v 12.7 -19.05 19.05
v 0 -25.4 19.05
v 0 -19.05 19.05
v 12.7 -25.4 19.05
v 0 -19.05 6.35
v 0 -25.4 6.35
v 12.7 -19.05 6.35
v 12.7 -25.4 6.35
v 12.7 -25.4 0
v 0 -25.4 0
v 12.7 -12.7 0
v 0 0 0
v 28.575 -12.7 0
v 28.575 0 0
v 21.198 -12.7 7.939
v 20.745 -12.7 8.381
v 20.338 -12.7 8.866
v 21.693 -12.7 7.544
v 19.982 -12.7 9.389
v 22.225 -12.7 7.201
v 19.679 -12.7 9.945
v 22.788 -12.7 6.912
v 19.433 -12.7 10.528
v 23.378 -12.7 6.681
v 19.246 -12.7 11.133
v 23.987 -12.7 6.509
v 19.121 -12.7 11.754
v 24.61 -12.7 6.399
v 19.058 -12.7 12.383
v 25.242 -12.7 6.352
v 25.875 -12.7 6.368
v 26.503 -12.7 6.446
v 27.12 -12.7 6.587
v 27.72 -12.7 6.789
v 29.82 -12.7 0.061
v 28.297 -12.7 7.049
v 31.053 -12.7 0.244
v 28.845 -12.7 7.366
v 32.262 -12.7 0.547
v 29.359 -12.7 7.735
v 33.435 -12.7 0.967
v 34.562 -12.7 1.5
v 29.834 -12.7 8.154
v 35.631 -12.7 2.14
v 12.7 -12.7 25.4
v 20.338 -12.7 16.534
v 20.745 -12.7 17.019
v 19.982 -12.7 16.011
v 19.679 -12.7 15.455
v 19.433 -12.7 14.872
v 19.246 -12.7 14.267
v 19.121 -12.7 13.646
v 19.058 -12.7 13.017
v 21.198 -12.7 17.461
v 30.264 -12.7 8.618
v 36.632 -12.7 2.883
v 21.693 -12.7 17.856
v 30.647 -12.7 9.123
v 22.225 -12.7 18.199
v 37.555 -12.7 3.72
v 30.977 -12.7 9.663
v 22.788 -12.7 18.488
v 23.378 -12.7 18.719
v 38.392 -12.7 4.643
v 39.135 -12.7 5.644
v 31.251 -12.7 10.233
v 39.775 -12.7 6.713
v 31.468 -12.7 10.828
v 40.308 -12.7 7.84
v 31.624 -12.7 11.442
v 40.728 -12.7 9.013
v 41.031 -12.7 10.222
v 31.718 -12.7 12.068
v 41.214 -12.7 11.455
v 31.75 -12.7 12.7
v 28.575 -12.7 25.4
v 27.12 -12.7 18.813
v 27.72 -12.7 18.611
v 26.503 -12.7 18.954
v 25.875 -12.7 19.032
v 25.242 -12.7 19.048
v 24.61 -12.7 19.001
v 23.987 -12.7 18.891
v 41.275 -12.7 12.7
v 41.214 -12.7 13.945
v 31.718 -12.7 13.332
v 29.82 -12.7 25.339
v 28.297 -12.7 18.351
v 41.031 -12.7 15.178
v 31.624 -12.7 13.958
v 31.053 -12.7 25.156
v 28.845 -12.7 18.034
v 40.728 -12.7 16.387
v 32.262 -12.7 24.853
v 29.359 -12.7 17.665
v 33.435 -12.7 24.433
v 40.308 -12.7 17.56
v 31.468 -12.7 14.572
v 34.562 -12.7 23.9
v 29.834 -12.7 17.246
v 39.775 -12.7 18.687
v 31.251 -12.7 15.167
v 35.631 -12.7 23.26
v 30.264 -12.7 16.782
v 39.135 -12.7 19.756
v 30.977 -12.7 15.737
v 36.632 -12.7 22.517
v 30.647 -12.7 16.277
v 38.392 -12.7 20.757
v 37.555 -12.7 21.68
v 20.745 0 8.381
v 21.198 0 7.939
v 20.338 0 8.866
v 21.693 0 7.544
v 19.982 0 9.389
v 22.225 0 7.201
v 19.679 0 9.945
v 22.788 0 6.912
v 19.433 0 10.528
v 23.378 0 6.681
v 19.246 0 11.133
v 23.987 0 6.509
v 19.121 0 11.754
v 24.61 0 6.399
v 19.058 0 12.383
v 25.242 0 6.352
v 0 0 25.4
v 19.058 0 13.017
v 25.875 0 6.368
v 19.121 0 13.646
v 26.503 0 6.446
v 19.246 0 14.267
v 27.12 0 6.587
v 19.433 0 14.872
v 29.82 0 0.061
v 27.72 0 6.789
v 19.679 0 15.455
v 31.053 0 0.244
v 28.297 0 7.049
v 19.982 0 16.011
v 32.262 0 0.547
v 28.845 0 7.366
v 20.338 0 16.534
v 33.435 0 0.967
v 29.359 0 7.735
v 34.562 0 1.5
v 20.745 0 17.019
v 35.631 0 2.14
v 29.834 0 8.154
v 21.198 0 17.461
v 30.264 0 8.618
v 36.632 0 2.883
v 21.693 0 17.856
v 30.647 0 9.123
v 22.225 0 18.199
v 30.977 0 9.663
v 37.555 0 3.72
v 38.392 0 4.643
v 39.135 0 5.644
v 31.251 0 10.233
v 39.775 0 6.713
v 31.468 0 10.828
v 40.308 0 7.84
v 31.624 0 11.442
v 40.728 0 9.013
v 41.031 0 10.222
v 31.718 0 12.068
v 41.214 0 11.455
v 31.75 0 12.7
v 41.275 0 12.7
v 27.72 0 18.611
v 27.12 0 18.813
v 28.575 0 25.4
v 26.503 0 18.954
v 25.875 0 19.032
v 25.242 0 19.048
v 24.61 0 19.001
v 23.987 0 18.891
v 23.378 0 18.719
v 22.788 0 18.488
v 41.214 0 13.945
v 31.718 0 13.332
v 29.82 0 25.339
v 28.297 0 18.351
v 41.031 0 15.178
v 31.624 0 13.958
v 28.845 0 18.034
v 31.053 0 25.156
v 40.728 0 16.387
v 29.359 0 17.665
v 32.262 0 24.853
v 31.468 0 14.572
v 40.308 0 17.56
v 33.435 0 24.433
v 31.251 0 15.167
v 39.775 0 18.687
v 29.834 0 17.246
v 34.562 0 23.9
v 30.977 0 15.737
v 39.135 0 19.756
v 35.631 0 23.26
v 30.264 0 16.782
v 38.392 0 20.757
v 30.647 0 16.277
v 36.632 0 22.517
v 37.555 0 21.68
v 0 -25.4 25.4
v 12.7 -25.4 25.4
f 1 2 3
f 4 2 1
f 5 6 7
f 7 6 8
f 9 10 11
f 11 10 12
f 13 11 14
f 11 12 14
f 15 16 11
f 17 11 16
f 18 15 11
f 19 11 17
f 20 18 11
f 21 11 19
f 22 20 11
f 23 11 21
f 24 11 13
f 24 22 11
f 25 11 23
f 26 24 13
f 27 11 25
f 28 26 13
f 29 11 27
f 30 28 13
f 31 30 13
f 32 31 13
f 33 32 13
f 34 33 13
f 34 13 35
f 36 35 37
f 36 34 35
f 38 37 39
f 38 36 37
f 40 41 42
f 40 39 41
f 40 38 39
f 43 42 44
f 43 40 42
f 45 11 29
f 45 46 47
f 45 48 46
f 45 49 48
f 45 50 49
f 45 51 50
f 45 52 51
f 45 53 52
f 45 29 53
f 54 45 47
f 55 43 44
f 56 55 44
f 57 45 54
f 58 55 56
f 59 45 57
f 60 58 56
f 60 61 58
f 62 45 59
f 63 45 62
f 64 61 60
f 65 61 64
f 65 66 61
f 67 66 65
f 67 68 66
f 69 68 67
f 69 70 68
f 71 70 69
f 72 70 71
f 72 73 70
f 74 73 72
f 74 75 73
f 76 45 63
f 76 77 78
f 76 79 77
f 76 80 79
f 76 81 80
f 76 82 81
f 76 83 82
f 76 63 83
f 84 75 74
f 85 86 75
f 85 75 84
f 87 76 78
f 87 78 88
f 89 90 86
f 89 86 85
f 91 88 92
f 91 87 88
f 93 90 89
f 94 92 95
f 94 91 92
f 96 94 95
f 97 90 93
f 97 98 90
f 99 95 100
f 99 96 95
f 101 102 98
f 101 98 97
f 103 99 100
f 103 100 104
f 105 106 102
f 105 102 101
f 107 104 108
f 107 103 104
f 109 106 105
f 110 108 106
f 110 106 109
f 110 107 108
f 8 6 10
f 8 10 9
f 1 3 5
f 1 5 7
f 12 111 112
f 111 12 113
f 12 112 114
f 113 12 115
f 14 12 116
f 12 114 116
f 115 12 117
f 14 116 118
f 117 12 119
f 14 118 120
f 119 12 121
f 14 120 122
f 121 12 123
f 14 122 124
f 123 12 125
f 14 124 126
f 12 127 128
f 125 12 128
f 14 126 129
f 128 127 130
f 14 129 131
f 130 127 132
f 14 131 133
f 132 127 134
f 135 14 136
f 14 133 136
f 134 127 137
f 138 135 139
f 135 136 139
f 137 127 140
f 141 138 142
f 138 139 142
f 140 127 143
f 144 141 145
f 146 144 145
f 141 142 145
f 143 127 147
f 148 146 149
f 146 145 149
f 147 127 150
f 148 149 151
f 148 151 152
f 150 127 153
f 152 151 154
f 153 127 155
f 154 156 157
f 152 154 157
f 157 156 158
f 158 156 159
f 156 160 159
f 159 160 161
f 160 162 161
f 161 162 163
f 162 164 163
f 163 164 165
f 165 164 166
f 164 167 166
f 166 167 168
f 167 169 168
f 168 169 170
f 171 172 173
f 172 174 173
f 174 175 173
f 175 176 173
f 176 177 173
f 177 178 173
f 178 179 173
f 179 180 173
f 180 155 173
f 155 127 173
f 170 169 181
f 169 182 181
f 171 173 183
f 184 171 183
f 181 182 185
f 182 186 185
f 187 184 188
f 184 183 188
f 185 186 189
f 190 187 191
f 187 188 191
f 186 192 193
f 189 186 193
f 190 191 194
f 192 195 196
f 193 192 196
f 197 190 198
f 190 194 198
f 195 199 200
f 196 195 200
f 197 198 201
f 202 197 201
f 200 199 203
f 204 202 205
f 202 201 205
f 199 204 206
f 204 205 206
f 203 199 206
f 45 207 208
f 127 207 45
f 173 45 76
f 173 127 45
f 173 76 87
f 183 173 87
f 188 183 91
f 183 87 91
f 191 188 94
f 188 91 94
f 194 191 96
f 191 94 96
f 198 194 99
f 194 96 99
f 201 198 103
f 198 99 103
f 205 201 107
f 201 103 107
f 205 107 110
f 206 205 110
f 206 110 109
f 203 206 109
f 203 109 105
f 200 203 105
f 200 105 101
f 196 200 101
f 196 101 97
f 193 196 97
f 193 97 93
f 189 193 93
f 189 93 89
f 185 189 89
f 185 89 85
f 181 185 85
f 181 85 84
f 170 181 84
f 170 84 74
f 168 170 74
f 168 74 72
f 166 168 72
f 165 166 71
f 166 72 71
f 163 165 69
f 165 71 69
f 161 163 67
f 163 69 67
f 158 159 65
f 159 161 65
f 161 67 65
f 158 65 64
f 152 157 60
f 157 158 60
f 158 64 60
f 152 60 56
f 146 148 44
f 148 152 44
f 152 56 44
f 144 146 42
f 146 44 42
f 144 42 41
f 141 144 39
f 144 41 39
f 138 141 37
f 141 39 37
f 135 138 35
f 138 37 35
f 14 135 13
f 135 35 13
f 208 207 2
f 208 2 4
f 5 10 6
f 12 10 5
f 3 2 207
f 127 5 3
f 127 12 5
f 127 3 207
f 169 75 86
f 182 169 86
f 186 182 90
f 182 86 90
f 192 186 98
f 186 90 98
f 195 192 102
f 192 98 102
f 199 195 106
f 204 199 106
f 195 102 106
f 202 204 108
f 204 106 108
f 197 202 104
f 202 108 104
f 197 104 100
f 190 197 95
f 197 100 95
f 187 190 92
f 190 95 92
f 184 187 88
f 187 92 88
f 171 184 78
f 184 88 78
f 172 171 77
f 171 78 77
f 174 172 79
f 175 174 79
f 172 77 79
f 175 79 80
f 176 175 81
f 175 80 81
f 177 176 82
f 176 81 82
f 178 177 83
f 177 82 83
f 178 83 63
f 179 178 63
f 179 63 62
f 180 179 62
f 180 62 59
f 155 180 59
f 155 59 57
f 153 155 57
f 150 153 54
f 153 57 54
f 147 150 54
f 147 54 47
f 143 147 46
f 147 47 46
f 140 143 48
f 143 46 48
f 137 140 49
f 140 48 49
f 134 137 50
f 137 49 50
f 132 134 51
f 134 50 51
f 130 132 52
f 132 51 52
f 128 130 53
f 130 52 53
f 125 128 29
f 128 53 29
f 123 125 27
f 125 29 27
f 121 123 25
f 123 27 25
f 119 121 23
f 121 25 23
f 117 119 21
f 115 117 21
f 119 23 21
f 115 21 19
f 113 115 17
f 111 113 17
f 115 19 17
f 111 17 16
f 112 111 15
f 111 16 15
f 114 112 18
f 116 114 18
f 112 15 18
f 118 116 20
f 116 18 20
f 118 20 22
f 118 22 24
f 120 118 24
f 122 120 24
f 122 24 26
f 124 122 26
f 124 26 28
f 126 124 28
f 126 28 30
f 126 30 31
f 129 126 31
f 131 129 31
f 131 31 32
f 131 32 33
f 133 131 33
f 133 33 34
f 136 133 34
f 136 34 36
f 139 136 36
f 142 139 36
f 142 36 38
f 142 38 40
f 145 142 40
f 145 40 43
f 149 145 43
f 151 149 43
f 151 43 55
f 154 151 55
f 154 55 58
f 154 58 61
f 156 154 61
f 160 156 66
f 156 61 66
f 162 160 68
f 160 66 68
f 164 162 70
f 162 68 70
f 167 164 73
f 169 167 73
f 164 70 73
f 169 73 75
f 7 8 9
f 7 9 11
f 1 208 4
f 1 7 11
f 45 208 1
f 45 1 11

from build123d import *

# Parameters (mm, degrees)
F0_W     = 44.45
F0_H     = 25.4
F1_DEPTH = 25.4
F2_W     = 31.75
F2_H     = 12.7
F3_DEPTH = 25.4
F5_DEPTH = 25.4
F6_W     = 12.7
F6_H     = 12.7
F7_DEPTH = 6.35
F8_R     = 6.35
F9_DEPTH = 12.7


with BuildPart() as f1:
    # F0 (on Front) → F1 (new body)
    with BuildSketch(Plane.XZ):
        with Locations((22.225, 12.7)):
            Rectangle(F0_W, F0_H)
    extrude(amount=F1_DEPTH)

    # F2 (on face) → F3 (cut)
    with BuildSketch(Plane.XY.offset(25.4)):
        with Locations((28.575, -19.05)):
            Rectangle(F2_W, F2_H)
    extrude(amount=-F3_DEPTH, mode=Mode.SUBTRACT)

    # F4 (on face) → F5 (cut)
    with BuildSketch(Plane.XZ.offset(12.7)):
        with BuildLine():
            ThreePointArc((28.575, 25.4), (41.275, 12.7), (28.575, 0))
            Line((28.575, 0), (44.45, 0))
            Line((44.45, 0), (44.45, 25.4))
            Line((44.45, 25.4), (28.575, 25.4))
        make_face()
    extrude(amount=-F5_DEPTH, mode=Mode.SUBTRACT)

    # F6 (on face) → F7 (cut)
    with BuildSketch(Plane.XZ.offset(25.4)):
        with Locations((6.35, 12.7)):
            Rectangle(F6_W, F6_H)
    extrude(amount=-F7_DEPTH, mode=Mode.SUBTRACT)

    # F8 (on face) → F9 (cut, through all)
    with BuildSketch(Plane.XZ.offset(12.7)):
        with Locations((25.4, 12.7)):
            Circle(F8_R)
    extrude(amount=-F9_DEPTH, mode=Mode.SUBTRACT)


solid = f1.part
